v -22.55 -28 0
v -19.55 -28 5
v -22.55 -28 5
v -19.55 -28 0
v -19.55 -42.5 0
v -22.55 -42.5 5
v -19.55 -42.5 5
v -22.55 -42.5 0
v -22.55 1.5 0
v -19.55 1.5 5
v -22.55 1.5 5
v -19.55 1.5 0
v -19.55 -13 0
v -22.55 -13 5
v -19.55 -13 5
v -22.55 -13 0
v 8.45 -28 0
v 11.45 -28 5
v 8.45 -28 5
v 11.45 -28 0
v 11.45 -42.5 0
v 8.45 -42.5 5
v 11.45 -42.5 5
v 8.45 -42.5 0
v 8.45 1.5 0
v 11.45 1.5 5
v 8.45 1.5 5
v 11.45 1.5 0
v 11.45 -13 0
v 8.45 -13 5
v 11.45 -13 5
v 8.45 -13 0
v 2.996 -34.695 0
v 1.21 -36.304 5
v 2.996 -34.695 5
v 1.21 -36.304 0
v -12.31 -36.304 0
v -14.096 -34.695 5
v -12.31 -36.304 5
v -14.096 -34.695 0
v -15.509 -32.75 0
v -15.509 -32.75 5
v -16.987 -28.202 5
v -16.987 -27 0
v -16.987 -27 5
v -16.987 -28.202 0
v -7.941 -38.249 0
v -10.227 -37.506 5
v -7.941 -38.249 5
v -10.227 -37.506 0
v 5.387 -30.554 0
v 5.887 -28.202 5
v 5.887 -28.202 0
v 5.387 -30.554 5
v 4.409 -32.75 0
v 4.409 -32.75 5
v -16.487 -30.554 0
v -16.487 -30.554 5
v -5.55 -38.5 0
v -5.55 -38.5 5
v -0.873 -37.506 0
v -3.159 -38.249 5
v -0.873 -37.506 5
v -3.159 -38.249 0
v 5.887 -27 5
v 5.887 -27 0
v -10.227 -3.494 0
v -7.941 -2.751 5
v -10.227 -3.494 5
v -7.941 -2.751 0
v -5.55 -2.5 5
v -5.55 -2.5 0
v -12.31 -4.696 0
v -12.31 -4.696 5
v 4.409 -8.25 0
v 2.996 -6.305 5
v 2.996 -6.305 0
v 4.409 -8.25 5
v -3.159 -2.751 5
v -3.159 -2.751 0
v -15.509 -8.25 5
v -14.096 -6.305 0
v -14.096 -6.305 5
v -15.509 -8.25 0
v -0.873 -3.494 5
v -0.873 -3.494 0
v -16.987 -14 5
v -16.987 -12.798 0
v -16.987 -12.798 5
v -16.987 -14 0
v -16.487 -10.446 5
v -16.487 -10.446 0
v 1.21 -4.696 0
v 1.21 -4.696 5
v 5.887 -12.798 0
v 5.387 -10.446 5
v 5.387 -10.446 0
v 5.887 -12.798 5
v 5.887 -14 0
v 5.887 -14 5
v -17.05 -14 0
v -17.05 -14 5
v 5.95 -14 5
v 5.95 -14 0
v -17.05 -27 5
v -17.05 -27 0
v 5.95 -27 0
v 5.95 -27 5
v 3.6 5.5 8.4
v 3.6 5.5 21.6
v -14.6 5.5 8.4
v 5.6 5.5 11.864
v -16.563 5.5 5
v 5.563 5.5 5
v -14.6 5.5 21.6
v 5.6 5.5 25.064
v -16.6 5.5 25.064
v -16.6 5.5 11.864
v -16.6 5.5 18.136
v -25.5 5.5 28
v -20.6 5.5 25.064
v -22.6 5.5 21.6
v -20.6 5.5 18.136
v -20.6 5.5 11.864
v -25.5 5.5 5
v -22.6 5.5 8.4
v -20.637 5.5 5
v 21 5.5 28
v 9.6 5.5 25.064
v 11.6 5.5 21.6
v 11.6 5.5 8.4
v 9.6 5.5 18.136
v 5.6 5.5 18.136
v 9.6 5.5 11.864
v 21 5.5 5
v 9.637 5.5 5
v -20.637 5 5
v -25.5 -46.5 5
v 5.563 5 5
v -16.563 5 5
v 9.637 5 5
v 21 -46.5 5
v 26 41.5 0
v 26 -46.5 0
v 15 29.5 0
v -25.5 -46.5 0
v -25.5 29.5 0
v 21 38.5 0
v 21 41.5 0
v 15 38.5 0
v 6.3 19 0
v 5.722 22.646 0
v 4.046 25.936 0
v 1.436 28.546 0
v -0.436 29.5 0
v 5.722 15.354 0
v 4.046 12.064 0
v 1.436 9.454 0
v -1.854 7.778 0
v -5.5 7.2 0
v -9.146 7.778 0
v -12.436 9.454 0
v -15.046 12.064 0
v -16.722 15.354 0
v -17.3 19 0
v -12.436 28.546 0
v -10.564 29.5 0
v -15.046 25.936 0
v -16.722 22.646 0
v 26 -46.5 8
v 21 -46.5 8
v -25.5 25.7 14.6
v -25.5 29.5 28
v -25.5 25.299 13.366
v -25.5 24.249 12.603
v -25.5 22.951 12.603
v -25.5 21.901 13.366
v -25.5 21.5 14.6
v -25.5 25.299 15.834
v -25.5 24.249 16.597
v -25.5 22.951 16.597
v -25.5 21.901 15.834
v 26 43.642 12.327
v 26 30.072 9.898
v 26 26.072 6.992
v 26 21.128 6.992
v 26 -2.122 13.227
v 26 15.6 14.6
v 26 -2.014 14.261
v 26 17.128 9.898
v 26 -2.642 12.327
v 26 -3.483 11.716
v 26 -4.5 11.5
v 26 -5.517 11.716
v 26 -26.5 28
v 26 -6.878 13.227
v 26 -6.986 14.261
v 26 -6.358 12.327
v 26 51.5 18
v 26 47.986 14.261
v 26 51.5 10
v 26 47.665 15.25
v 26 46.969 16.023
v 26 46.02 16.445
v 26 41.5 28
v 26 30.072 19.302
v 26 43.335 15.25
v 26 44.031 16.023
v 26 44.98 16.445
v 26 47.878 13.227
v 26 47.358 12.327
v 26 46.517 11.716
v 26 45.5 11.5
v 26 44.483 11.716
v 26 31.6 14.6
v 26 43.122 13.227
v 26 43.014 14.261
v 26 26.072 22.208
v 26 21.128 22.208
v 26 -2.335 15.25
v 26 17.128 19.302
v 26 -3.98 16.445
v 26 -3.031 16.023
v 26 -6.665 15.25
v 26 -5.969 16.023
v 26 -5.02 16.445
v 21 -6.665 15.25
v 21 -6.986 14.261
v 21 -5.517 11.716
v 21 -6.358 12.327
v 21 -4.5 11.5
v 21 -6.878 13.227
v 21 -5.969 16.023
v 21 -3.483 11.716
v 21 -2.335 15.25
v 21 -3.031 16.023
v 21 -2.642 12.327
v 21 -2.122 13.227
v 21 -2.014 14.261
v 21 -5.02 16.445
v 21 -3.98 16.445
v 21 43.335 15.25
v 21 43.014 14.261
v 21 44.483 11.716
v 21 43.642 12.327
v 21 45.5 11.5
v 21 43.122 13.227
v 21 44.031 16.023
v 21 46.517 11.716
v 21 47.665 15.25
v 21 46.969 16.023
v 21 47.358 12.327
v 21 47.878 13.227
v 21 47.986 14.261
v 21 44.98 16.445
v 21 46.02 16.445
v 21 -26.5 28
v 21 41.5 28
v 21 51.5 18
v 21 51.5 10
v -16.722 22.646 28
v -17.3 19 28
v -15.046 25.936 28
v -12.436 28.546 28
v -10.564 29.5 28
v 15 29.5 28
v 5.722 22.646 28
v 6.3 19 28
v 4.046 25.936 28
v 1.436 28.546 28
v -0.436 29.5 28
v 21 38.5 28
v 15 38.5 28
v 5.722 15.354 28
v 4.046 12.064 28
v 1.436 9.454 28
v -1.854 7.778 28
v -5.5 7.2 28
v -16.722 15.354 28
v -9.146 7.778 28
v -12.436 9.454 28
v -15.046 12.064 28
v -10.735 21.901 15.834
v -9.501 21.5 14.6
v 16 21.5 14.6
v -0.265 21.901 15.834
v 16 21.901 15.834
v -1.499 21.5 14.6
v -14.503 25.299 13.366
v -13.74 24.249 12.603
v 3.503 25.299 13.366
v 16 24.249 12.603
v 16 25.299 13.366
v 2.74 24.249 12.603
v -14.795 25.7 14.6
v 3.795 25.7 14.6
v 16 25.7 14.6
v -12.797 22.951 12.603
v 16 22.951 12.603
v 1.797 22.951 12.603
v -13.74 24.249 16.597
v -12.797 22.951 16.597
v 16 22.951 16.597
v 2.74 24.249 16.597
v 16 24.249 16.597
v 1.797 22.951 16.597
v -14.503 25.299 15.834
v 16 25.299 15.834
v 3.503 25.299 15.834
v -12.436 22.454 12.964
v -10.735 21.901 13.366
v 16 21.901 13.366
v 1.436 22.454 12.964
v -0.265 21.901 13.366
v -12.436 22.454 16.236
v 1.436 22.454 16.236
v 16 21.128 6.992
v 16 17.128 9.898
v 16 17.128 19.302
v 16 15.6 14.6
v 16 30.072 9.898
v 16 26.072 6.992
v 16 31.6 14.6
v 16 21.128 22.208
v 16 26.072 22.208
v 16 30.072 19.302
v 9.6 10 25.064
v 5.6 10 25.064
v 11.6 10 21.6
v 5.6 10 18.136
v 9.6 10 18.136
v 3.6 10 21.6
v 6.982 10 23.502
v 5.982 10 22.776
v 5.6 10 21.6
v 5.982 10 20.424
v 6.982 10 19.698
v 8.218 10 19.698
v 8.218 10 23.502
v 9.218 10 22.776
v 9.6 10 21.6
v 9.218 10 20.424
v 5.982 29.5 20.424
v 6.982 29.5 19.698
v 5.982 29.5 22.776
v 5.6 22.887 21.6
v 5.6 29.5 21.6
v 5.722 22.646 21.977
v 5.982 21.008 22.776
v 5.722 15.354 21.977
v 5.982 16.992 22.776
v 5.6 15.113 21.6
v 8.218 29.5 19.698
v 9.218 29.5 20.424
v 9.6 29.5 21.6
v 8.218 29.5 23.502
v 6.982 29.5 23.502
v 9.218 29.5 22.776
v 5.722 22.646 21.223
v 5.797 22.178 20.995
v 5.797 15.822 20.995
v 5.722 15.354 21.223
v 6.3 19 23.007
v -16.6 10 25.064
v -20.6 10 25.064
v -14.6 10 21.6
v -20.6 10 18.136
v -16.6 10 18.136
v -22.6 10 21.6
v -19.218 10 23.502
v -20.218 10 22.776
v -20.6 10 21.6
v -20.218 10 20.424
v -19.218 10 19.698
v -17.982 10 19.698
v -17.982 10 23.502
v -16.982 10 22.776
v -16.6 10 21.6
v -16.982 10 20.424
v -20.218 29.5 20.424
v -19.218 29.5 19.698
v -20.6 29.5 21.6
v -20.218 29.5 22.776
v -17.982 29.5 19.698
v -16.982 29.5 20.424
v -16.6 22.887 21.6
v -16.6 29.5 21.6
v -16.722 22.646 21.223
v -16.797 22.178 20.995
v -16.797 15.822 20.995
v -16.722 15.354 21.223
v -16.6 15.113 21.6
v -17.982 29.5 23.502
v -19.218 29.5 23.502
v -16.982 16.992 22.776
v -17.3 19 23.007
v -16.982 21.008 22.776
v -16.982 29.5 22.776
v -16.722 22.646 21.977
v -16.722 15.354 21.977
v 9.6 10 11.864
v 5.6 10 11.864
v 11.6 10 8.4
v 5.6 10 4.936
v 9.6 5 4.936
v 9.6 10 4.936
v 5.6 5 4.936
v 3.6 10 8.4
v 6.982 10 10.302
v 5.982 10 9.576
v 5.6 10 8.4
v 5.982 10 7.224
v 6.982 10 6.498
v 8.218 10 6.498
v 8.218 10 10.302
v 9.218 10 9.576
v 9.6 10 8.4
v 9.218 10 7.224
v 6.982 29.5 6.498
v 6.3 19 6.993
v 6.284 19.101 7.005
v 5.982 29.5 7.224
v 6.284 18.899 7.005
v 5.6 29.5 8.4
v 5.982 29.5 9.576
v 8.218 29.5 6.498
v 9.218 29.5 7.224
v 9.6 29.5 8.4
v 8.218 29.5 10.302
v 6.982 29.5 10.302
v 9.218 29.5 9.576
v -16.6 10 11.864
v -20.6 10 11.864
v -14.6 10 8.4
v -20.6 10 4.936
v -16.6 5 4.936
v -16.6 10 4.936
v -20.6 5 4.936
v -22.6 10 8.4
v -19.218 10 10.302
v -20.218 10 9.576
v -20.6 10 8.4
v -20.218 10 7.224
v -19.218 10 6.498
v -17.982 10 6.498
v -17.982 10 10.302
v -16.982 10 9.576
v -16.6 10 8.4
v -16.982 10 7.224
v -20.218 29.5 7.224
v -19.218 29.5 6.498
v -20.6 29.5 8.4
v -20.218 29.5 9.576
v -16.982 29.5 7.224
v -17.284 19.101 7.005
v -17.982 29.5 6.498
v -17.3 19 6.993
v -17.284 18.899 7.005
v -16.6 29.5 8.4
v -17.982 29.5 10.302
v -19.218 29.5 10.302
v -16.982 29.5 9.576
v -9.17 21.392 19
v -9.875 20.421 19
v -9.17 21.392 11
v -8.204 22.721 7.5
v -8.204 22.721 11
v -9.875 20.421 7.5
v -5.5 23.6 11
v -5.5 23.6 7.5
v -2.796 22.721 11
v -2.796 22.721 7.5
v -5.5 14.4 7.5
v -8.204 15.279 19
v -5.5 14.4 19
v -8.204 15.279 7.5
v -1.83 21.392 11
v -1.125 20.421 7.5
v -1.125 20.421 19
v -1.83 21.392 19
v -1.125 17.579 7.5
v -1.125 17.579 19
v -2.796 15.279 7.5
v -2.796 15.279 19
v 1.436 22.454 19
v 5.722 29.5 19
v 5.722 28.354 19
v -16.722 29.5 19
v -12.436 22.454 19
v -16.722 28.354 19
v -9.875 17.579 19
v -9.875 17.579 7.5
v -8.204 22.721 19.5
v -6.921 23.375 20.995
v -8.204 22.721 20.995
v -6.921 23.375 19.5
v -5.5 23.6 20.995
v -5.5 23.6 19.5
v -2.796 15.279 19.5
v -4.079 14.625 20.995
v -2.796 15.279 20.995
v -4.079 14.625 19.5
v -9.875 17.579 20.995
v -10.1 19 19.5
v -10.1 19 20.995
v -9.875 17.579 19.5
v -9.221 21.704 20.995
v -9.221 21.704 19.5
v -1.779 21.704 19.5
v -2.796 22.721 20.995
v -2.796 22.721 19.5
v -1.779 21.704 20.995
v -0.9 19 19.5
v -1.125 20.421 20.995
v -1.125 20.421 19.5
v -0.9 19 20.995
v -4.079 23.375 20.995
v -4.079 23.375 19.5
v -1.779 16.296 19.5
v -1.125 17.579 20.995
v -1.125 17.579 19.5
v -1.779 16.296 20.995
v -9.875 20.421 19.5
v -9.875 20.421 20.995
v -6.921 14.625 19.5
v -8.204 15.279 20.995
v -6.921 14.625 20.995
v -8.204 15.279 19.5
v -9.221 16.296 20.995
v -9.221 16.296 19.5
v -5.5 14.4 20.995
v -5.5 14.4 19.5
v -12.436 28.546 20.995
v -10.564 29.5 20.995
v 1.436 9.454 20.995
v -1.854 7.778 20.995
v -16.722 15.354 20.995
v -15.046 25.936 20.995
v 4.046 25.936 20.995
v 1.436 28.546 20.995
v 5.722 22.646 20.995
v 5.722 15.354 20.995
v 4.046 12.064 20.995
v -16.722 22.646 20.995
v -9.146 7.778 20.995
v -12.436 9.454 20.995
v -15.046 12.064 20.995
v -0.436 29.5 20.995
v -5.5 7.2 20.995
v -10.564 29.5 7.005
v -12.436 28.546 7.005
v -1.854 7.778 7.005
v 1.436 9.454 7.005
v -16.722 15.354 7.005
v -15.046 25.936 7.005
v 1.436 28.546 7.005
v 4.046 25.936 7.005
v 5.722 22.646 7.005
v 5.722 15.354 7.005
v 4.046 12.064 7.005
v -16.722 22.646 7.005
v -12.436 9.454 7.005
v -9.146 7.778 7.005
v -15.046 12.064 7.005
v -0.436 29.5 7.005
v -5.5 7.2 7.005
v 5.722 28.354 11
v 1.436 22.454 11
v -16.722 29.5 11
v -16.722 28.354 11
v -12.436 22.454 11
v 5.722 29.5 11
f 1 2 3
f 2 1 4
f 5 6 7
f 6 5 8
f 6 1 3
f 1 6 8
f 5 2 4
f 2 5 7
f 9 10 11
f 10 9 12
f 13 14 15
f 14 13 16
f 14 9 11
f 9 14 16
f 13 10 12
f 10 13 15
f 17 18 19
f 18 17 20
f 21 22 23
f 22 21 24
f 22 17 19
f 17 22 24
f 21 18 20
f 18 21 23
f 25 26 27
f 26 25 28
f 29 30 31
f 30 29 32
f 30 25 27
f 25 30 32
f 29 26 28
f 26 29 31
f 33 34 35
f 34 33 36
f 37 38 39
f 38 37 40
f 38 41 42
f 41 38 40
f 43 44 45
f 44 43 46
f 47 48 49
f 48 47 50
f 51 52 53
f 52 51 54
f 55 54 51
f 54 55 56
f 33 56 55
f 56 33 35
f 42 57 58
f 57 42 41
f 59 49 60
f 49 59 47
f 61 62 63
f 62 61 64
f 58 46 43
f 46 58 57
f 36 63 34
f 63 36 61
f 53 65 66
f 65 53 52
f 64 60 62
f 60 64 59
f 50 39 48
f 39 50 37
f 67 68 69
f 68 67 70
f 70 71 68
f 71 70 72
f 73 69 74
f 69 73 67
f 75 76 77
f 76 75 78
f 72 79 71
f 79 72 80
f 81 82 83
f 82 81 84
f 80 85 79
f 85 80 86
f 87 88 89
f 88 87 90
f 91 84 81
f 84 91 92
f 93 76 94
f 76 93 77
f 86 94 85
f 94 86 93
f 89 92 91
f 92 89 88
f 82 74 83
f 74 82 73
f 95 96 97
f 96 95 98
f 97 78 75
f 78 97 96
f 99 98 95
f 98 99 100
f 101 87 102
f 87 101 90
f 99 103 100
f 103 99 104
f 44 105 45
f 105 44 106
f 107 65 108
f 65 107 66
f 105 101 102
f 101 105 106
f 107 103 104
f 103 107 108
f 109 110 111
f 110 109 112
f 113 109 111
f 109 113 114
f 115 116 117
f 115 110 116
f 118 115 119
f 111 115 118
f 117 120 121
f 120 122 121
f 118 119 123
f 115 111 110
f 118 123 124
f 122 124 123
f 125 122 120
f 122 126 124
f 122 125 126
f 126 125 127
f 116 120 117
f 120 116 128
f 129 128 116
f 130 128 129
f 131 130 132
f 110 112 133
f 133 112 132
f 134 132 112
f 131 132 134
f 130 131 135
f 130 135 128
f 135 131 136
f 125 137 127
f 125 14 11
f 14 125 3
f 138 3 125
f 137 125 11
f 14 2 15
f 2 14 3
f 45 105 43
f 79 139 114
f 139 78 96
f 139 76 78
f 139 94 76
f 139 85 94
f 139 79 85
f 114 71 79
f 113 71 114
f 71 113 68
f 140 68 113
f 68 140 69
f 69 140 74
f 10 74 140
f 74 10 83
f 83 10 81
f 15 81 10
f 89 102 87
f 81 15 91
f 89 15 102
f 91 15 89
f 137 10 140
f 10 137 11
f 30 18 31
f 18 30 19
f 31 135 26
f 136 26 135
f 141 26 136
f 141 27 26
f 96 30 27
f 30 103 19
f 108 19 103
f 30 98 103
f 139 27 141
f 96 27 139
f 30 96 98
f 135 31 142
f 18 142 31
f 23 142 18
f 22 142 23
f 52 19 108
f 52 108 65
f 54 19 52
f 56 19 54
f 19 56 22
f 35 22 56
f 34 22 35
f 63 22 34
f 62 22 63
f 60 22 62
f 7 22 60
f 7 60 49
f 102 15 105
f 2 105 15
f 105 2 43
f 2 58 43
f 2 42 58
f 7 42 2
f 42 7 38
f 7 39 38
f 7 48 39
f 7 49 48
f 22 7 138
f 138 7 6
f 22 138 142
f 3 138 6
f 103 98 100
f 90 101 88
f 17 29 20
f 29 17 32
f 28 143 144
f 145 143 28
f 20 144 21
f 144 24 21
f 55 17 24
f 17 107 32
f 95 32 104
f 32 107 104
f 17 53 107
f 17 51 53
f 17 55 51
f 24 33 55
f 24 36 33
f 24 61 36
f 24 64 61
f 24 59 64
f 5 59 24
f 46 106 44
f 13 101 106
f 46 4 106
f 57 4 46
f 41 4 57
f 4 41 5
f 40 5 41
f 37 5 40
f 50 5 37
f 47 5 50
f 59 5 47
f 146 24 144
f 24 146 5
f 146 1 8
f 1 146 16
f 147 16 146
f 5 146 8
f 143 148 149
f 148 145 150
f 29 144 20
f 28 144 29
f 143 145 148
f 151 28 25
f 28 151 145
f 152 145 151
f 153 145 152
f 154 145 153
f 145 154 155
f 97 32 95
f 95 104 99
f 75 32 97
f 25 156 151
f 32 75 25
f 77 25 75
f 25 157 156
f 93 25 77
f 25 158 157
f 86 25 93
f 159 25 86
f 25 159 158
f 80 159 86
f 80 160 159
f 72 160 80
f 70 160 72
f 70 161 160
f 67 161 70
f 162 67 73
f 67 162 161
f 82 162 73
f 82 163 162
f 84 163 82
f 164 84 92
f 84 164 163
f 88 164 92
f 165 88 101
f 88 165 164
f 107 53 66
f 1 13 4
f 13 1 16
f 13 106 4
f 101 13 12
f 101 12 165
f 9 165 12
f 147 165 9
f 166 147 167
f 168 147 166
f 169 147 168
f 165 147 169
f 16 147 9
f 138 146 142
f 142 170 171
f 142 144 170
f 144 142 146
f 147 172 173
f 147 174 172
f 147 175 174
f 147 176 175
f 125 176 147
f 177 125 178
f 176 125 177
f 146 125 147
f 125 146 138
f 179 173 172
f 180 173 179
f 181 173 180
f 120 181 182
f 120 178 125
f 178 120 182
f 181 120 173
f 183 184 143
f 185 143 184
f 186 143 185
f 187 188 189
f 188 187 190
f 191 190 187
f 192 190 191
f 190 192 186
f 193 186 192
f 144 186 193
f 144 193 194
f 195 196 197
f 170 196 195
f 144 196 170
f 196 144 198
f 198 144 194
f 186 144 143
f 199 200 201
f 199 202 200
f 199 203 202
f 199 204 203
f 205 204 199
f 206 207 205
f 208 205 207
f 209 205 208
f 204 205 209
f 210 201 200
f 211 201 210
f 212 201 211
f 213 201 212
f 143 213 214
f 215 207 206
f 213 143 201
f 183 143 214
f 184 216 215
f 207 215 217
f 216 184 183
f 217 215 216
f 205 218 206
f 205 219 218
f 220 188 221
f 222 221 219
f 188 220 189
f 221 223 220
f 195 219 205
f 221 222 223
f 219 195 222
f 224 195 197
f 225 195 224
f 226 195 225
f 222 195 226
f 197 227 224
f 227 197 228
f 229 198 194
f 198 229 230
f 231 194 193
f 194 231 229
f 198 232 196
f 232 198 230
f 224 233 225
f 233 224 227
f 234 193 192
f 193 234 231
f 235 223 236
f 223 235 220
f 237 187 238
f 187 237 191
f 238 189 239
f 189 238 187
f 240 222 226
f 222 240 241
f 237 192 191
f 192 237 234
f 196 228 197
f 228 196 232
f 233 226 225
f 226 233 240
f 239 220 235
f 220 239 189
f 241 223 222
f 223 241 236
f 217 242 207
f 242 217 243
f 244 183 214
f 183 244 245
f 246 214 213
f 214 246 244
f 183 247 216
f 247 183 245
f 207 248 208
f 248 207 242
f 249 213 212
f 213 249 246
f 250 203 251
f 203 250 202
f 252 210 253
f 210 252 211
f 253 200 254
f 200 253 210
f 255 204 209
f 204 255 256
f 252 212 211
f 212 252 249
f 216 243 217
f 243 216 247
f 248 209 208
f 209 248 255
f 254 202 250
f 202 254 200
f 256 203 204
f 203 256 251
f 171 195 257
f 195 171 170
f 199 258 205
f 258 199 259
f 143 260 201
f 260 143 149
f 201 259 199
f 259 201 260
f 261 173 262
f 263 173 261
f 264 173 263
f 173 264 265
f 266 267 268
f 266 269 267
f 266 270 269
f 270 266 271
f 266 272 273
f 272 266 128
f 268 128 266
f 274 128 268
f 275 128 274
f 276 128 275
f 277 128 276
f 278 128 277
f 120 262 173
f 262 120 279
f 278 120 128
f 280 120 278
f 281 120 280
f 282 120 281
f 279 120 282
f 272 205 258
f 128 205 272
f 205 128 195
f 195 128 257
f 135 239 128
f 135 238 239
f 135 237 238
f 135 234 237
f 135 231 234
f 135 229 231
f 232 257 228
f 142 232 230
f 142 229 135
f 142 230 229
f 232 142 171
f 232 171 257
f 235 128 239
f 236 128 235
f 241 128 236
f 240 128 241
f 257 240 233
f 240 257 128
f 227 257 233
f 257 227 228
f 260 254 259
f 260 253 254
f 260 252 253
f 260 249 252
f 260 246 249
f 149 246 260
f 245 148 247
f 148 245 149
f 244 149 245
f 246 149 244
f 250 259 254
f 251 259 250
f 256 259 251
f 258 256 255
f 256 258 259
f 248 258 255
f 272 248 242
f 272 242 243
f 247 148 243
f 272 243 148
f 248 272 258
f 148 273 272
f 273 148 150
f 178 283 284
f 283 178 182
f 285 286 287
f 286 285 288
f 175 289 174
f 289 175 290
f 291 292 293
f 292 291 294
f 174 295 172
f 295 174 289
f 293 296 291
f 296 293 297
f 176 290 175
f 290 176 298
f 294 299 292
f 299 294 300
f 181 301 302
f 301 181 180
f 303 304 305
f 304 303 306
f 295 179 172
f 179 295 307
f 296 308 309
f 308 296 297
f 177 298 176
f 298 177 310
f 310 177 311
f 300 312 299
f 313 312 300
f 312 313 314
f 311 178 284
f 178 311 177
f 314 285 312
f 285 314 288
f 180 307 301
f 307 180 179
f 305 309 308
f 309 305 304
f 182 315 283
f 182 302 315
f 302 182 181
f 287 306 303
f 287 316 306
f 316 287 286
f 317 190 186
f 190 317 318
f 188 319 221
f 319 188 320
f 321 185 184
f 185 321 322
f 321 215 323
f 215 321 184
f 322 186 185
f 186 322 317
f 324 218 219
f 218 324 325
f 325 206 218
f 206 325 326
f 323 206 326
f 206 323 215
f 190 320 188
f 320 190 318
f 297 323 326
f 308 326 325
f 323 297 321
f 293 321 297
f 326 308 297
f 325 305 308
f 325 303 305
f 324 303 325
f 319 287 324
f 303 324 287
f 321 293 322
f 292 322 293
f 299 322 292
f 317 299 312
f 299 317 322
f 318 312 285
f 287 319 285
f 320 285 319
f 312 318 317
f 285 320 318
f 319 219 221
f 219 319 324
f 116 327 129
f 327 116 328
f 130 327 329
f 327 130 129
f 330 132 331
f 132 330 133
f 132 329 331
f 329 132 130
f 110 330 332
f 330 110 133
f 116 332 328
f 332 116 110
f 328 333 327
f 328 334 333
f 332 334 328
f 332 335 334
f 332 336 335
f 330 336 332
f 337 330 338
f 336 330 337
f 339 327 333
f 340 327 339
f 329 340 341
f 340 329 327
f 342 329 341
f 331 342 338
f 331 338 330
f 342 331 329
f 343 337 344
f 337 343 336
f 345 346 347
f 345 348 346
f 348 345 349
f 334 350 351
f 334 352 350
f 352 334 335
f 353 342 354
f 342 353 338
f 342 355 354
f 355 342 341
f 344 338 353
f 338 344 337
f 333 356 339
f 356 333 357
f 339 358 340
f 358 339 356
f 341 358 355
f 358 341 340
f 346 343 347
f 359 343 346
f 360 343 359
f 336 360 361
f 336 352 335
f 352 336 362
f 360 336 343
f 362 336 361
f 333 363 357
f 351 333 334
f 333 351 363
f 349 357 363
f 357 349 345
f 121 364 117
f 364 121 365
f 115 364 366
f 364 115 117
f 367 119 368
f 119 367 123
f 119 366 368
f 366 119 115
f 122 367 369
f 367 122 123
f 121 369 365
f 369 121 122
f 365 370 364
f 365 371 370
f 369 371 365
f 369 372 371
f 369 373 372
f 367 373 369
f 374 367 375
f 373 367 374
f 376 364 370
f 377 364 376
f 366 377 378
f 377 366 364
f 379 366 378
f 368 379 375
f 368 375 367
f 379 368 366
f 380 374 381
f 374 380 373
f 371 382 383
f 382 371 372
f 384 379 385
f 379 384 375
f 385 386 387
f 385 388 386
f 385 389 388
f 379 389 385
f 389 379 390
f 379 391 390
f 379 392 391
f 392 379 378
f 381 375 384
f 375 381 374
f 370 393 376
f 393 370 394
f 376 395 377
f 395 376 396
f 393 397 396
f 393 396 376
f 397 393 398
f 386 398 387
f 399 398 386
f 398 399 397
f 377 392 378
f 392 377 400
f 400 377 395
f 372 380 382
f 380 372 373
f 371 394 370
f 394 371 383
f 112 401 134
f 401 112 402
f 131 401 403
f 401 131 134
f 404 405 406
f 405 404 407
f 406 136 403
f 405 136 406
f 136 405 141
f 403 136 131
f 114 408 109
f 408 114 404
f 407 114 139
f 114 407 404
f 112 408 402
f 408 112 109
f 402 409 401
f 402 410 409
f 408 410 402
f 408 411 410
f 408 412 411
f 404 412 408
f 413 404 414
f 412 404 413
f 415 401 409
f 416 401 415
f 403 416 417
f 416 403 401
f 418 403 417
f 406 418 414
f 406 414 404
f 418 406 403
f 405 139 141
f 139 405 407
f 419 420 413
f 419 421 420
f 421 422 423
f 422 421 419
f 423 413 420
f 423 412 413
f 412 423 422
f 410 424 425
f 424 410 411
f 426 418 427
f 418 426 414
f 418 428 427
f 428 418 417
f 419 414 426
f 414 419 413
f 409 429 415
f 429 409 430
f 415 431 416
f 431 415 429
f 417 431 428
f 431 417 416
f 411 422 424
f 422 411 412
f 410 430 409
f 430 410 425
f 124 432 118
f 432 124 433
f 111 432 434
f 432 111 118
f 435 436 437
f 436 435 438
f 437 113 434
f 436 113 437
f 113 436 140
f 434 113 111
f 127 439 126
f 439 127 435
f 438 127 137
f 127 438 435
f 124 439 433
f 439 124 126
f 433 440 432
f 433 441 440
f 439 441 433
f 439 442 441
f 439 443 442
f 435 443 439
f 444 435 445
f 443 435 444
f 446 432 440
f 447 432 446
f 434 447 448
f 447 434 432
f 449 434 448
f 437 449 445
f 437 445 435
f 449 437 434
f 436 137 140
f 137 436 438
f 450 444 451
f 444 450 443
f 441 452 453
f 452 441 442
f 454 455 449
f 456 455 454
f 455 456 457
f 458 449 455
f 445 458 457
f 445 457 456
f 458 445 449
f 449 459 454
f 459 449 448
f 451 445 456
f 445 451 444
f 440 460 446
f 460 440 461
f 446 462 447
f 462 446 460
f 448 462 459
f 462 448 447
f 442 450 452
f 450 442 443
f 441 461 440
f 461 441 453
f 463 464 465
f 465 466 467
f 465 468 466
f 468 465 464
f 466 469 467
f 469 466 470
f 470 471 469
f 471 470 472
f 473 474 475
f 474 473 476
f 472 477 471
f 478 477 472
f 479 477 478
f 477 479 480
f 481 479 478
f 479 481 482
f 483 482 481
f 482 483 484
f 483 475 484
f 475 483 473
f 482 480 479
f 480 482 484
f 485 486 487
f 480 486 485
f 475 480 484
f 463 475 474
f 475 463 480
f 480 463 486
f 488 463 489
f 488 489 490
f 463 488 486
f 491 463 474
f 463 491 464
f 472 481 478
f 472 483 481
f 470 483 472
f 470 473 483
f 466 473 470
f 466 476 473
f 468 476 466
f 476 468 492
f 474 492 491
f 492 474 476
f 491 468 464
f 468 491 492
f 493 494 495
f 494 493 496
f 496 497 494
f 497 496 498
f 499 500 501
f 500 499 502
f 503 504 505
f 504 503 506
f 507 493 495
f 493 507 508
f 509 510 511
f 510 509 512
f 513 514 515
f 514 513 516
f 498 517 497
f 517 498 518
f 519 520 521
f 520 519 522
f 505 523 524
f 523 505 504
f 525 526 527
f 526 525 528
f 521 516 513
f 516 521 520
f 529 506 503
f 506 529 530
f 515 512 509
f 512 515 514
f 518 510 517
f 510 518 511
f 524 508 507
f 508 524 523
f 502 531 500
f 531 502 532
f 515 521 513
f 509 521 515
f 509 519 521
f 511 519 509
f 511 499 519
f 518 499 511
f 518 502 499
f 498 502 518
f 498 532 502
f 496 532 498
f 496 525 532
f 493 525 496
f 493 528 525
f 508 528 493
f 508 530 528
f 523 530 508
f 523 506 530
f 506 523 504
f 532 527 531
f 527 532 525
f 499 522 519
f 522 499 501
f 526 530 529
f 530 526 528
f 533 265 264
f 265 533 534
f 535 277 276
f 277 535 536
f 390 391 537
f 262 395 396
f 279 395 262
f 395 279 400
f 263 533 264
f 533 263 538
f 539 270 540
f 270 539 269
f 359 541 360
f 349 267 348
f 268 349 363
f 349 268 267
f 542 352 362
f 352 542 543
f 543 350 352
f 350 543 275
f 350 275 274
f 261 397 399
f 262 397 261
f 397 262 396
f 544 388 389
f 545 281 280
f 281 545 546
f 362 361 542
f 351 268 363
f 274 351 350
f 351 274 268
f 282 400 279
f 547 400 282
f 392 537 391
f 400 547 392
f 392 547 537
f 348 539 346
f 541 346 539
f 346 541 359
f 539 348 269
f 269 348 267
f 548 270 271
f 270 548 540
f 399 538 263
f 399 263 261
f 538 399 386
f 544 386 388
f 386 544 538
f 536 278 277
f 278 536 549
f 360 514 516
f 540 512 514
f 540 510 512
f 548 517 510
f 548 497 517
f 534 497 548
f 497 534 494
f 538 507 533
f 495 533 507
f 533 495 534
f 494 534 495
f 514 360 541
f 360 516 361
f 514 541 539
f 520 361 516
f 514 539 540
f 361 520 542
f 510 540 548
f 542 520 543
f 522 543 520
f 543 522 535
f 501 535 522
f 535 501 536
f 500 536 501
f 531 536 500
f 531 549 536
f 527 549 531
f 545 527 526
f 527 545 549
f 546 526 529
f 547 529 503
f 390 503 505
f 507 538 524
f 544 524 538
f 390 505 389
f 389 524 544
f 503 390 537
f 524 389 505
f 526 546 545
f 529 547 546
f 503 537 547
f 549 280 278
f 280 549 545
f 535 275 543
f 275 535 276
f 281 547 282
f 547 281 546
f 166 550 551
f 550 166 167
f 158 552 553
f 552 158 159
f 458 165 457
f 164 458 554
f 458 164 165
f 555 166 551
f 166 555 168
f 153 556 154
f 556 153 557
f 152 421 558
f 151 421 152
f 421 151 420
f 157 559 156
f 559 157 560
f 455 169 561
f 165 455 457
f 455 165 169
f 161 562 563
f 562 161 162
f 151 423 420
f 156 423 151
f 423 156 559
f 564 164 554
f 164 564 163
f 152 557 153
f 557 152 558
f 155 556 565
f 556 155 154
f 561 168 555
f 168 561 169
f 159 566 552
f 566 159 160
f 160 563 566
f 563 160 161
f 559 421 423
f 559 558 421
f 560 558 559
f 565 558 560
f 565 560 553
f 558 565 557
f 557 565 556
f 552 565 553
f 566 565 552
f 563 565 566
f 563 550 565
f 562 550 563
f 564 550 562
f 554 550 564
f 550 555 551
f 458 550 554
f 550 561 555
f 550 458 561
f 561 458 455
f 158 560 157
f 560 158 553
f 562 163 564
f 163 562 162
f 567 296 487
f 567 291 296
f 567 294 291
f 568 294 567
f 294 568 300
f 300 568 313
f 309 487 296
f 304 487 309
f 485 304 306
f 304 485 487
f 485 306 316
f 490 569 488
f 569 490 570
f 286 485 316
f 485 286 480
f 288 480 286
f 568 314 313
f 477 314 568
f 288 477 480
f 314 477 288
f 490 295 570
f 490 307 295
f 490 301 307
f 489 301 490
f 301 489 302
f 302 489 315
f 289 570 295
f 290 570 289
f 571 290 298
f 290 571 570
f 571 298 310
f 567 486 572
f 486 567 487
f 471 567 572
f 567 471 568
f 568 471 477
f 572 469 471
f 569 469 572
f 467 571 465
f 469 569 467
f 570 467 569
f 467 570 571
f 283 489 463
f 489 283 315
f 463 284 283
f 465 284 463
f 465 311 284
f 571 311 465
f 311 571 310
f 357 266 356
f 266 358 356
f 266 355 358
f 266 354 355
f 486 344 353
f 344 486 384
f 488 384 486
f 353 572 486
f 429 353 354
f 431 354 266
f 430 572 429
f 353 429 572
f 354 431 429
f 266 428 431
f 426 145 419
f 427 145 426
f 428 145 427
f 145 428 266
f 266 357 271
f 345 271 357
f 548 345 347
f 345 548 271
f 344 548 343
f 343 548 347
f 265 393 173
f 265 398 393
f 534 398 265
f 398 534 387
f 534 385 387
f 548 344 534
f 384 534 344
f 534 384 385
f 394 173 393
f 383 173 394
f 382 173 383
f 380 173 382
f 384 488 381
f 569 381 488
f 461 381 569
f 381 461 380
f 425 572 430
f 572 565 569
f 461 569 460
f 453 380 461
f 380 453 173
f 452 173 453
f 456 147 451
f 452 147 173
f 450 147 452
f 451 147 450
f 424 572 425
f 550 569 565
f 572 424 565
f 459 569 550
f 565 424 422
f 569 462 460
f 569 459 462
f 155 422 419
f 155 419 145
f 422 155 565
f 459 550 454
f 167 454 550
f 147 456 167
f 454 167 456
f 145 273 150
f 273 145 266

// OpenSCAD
/*
 *  Remake of the main extruder block for Wade's geared extruder
 *  by Len Trigg <lenbok@gmail.com> 2010-05-08
 *
 *  This program is free software; you can redistribute it and/or modify
 *  it under the terms of the GNU General Public License as published by
 *  the Free Software Foundation; either version 2 of the License, or
 *  (at your option) any later version.
 *
 *  This program is distributed in the hope that it will be useful,
 *  but WITHOUT ANY WARRANTY; without even the implied warranty of
 *  MERCHANTABILITY or FITNESS FOR A PARTICULAR PURPOSE.  See the
 *  GNU General Public License for more details.
 *
 *  You should have received a copy of the GNU General Public License
 *  along with this program; if not, write to the Free Software
 *  Foundation, Inc., 59 Temple Place, Suite 330, Boston, MA  02111-1307  USA
 *
 */

// Standard Wade extruder dimensions
mount_thickness = 5;
motor_mount_height = 51.5;
motor_mount_width = 57;
extruder_mount_length = 110;
extruder_mount_width = 28;
extruder_mount_hole_separation = 50;
extruder_block_width = 33;
extruder_block_width_final = 24;
filament_rad=2.1;
ptfe_rad=8;
ptfe_depth=10;
m8_height_off=31.5;
m8_rad=4.6;
bearing_rad=11.8;
bearing_width=7;
hex_nut_rad=4;
hex_nut_depth=4;
slot_height = 3;
slot_width = 16;
slot_offset_x = 23.5;
slot_offset_y = 14;

// Modifications to shrink it carefully to make it fit on a makerbot build platform
// Comment these out if you want the regular one
motor_mount_width = 52;
extruder_mount_length = 98;
slot_offset_x = 22;
slot_width = 14.5;


module motor_mount_holes() {
    motor_center_x = motor_mount_width/2;
    motor_center_y = motor_mount_height/2+5.8;
    motor_mount_hole_rad = 11.5;
    // Top two slots
    translate([motor_center_x-slot_offset_x, motor_center_y+slot_offset_y, -1])
    cube([slot_width, slot_height, mount_thickness+2]);
    translate([motor_center_x+slot_offset_x-slot_width, motor_center_y+slot_offset_y, -1])
    cube([slot_width, slot_height, mount_thickness+2]);
    // Bottom two slots
    translate([motor_center_x-slot_offset_x, motor_center_y-slot_offset_y-slot_height, -1])
    cube([slot_width, slot_height, mount_thickness+2]);
    translate([motor_center_x+slot_offset_x-slot_width, motor_center_y-slot_offset_y-slot_height, -1])
    cube([slot_width, slot_height, mount_thickness+2]);
    // Center removed piece
    translate([motor_center_x-6.5, motor_center_y, -1]) cylinder(h=mount_thickness+2, r=motor_mount_hole_rad);
    translate([motor_center_x+6.5, motor_center_y, -1]) cylinder(h=mount_thickness+2, r=motor_mount_hole_rad);
    translate([motor_center_x-6.5, motor_center_y-motor_mount_hole_rad, -1]) cube([6.5*2,motor_mount_hole_rad*2, mount_thickness+2]);
}

module motor_mount_plate() {
    difference() {
        cube([motor_mount_width, motor_mount_height, mount_thickness]);
        motor_mount_holes();
    }
}

module extruder_mount_plate() {
    difference() {
        cube([extruder_mount_length, mount_thickness, extruder_mount_width]);
        union() {
            // Chop the ends a little
            translate([0,-1,8]) rotate([0,-45,0]) cube(extruder_mount_width*2, mount_thickness+2, extruder_mount_width*2);
            translate([extruder_mount_length,-1,extruder_mount_width-10]) rotate([0,-45,0]) cube(extruder_mount_width*2, mount_thickness+2, extruder_mount_width*2);
            translate([extruder_mount_length,-1,10]) rotate([0,135,0]) cube(extruder_mount_width*2, mount_thickness+2, extruder_mount_width*2);

            // Mounting holes
            translate([motor_mount_width - 10, -1, extruder_mount_width/2])
            union() {
                rotate([0,90,90]) cylinder(h=mount_thickness+2, r=2.5, $fn=15);
                translate([extruder_mount_hole_separation, 0, 0]) rotate([0,90,90]) cylinder(h=mount_thickness+2, r=2.5, $fn=15);
            }
        }
    }
}

module hex_head_hole() {
    translate([-1,0,0]) rotate([-90,0,-90]) {
        cylinder(r=hex_nut_rad,h=hex_nut_depth+1,$fn=6);
        cylinder(r=2.0,h=extruder_mount_width+2,$fn=10);
    }
}

module extruder_holes() {
    // Filament and ptfe insulator
    translate([m8_rad,-1,0.6]) {
        rotate([-90,0,0]) {
            cylinder(r=filament_rad,h=motor_mount_height+2,$fn=10);
            cylinder(r=ptfe_rad,h=ptfe_depth+1,$fn=10);
        }
    }
    // Screw holes into ptfe insulator
    ptfe_screw_offset=ptfe_rad-2.4;
    //translate([m8_rad-ptfe_screw_offset,5,-extruder_mount_width/2-1]) cylinder(r=1.5,h=extruder_mount_width+2,$fn=15);
    //translate([m8_rad+ptfe_screw_offset,5,-extruder_mount_width/2-1]) cylinder(r=1.5,h=extruder_mount_width+2,$fn=15);

    
    outer_bearing_off=extruder_mount_width/2-bearing_width/2;
    // M8 shaft, leave a thin disk to be removed after printing
    translate([0,m8_height_off,-outer_bearing_off+4]) cylinder(r=m8_rad,h=11.5,$fn=10,center=false);
    translate([0,m8_height_off,bearing_width/2+2]) cylinder(r=m8_rad,h=10,$fn=20,center=false);

    // bearings for M8 shaft
    translate([0,m8_height_off,outer_bearing_off]) cylinder(r=bearing_rad,h=bearing_width+0.01,$fn=20,center=true);
    translate([0,m8_height_off,-outer_bearing_off]) cylinder(r=bearing_rad,h=bearing_width+0.01,$fn=20,center=true);
    
    // Idler bearing slot
    z_offset=1;
    translate([13,m8_height_off,z_offset]) cylinder(r=bearing_rad,h=bearing_width+1,$fn=10,center=true);

    // Idler block attachment screws
    screw_off_y=13.1;
    screw_off_z=6.6;
    translate([-13,m8_height_off-screw_off_y,z_offset+screw_off_z]) hex_head_hole();
    translate([-13,m8_height_off+screw_off_y,z_offset+screw_off_z]) hex_head_hole();
    translate([-13,m8_height_off-screw_off_y,z_offset-screw_off_z]) hex_head_hole();
    translate([-13,m8_height_off+screw_off_y,z_offset-screw_off_z]) hex_head_hole();
}

module m8_extruder_block() {
    difference() {
        union() {
            translate([-motor_mount_width,0,0]) motor_mount_plate();
            translate([-motor_mount_width,0,0]) extruder_mount_plate();
            cube([extruder_block_width, motor_mount_height, extruder_mount_width]);
        }
        union() {
            translate([extruder_block_width_final,11, -1]) cube([extruder_block_width, motor_mount_height, extruder_mount_width+2]);
            translate([13.5,0,extruder_mount_width/2]) extruder_holes();
        }
    }
}

// In case you want to see the original for comparison purposes
module m8_extruder_block_orig() {
    import_stl("M8_Extruder_Block_3.stl");
}
// translate([-motor_mount_width,0,-28]) m8_extruder_block_orig();

// Position to build nicely on the (or at least my) makerbot platform
translate([motor_mount_width/2,motor_mount_height-46,0]) rotate([0,0,90]) m8_extruder_block();
